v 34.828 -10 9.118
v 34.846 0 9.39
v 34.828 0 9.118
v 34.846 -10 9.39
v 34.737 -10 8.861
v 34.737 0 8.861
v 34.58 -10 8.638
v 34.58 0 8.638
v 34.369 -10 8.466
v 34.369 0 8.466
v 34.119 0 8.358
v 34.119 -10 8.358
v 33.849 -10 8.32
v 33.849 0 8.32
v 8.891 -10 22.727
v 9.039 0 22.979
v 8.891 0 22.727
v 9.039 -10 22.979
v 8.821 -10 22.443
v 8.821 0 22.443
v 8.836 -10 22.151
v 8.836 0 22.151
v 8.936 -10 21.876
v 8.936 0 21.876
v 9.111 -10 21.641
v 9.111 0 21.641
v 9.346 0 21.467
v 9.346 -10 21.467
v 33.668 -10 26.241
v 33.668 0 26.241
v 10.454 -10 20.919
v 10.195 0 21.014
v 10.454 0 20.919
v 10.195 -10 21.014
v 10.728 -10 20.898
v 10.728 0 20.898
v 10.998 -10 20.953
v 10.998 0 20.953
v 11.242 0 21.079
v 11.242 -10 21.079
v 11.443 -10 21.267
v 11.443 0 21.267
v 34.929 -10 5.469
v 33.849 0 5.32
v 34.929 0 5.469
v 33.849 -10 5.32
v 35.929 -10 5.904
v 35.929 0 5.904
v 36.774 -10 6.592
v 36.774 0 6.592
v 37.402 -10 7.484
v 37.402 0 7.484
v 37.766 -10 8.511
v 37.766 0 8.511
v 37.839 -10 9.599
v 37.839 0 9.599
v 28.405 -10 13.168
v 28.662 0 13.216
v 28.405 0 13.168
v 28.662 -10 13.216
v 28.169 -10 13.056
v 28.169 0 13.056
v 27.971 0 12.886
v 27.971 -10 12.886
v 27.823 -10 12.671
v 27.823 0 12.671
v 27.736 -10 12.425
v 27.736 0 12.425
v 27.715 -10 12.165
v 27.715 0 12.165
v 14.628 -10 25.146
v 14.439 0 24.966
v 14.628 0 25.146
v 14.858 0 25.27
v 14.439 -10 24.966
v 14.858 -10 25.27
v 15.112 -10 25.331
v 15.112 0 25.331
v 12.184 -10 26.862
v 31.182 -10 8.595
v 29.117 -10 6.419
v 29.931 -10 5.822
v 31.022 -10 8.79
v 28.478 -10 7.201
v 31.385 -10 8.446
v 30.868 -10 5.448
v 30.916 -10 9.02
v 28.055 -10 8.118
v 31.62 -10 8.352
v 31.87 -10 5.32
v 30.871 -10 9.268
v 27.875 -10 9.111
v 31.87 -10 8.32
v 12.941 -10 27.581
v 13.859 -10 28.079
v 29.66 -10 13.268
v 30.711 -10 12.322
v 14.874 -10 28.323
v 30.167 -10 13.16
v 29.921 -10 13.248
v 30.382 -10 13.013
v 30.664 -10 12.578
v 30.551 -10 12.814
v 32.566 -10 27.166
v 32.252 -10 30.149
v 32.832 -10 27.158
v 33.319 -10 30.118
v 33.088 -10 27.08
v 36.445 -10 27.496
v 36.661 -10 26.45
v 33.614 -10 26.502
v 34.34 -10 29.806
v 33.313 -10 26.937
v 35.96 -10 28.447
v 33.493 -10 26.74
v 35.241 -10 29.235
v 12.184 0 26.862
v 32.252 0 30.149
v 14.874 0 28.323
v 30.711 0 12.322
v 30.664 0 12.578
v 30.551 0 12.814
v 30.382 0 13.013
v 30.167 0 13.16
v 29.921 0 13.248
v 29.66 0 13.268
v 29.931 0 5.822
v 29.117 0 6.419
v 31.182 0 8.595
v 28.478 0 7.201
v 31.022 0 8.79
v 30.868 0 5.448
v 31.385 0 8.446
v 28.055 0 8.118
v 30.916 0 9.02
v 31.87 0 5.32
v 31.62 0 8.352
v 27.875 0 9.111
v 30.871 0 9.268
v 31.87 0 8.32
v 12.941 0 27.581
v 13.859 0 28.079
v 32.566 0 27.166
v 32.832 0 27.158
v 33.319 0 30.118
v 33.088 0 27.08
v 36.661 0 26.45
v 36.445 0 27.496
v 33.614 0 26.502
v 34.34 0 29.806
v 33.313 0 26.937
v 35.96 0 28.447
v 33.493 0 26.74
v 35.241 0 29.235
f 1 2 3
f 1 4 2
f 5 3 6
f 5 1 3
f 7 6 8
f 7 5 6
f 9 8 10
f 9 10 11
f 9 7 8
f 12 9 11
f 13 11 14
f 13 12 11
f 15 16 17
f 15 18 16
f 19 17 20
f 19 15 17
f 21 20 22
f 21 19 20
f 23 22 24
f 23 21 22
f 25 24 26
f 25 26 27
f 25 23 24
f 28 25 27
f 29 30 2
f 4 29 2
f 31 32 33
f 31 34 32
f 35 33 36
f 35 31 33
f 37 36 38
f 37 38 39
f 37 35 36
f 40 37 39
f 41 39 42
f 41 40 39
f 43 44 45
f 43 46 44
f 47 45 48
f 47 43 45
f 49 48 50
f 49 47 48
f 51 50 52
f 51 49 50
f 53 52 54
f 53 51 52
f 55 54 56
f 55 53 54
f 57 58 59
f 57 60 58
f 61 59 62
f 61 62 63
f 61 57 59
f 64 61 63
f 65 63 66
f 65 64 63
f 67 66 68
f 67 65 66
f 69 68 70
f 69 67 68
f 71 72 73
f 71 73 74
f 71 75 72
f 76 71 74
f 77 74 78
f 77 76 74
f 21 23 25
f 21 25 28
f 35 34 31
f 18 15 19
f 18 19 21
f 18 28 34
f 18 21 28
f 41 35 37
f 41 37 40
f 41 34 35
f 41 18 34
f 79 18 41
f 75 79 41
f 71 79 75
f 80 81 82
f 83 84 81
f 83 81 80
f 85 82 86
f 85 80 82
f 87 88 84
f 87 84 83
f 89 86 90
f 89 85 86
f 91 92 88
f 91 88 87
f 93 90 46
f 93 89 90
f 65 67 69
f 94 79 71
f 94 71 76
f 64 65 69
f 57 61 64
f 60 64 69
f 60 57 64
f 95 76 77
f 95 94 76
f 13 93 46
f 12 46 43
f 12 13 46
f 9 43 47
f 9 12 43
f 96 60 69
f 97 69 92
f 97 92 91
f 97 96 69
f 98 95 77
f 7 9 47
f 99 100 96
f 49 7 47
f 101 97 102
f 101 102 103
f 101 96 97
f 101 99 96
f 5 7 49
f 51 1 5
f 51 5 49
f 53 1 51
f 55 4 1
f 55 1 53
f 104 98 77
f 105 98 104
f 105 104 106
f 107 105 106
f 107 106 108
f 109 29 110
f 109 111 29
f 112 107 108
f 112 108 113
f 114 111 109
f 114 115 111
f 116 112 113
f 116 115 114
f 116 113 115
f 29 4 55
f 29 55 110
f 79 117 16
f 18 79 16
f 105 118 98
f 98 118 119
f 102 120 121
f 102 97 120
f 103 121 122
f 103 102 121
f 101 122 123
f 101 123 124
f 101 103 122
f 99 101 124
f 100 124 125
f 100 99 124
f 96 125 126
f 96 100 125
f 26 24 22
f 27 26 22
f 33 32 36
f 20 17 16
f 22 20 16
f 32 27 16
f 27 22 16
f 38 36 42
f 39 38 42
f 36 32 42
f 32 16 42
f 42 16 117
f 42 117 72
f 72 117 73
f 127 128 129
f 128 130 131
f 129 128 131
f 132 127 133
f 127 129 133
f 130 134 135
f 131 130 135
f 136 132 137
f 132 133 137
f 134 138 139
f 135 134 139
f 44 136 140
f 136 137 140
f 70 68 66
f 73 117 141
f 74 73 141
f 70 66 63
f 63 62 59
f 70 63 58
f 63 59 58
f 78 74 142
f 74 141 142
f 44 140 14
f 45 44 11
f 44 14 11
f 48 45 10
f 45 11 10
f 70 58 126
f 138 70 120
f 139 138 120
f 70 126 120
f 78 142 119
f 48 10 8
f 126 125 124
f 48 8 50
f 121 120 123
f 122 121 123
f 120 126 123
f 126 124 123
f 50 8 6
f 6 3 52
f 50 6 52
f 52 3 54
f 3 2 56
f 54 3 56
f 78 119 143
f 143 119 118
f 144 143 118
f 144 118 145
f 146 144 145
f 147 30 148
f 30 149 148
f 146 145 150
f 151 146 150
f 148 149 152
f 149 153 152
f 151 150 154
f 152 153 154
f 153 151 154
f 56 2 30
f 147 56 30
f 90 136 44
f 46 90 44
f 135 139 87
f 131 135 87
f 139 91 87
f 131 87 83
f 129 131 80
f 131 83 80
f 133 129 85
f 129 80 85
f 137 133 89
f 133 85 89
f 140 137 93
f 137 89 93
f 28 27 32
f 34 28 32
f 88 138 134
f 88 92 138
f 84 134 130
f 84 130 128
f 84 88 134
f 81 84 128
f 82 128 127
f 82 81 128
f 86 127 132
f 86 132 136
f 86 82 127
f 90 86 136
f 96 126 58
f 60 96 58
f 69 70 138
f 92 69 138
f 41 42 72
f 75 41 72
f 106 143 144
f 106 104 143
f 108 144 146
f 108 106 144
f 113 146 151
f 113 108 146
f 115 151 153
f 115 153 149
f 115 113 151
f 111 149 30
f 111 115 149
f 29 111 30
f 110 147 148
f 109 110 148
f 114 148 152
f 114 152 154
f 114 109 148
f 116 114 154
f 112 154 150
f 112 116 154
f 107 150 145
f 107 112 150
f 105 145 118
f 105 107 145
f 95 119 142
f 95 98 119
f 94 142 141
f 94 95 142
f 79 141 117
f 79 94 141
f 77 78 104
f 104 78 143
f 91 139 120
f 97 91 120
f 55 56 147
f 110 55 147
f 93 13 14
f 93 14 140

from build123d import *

# Parameters (mm, degrees)
F1_DEPTH = 10
F2_R     = 1
F3_R     = 4


# Not quite as in the source:
# - two fillets or chamfers of one size are made in one step
# - a feature names something its author has since deleted; it is built from what else it names


with BuildPart() as f1:
    # F0 (on Front) → F1 (new body)
    with BuildSketch(Plane.XZ):
        Polygon((30.9209997221, 8.3203603271), (30.6589608257, 13.3203603271), (27.6630722214, 13.1633524584), (28.0741060219, 5.3203603271), (38.1381058522, 5.3203603271), (36.3716140423, 30.5823701452), (13.2265466485, 28.1497255366), (8.2771753479, 22.0377609909), (10.9237883626, 20.6251607112), (14.6997107089, 25.28803648), (33.5956267209, 27.274077282), (34.9209997221, 8.3203603271), align=None)
    extrude(amount=F1_DEPTH)

    # F2
    f2_edges = [f1.edges().sort_by_distance(p)[0] for p in [
        (34.921, -5, 8.32036),
        (30.921, -5, 8.32036),
        (14.699711, -5, 25.288036),
        (8.277175, -5, 22.037761),
        (10.923788, -5, 20.625161),
        (33.595627, -5, 27.274077),
        (30.658961, -5, 13.32036),
        (27.663072, -5, 13.163352),
    ]]
    fillet(f2_edges, radius=F2_R)

    # F3
    f3_edges = [f1.edges().sort_by_distance(p)[0] for p in [
        (38.138106, -5, 5.32036),
        (28.074106, -5, 5.32036),
        (13.226547, -5, 28.149726),
        (36.371614, -5, 30.58237),
    ]]
    fillet(f3_edges, radius=F3_R)


solid = f1.part
